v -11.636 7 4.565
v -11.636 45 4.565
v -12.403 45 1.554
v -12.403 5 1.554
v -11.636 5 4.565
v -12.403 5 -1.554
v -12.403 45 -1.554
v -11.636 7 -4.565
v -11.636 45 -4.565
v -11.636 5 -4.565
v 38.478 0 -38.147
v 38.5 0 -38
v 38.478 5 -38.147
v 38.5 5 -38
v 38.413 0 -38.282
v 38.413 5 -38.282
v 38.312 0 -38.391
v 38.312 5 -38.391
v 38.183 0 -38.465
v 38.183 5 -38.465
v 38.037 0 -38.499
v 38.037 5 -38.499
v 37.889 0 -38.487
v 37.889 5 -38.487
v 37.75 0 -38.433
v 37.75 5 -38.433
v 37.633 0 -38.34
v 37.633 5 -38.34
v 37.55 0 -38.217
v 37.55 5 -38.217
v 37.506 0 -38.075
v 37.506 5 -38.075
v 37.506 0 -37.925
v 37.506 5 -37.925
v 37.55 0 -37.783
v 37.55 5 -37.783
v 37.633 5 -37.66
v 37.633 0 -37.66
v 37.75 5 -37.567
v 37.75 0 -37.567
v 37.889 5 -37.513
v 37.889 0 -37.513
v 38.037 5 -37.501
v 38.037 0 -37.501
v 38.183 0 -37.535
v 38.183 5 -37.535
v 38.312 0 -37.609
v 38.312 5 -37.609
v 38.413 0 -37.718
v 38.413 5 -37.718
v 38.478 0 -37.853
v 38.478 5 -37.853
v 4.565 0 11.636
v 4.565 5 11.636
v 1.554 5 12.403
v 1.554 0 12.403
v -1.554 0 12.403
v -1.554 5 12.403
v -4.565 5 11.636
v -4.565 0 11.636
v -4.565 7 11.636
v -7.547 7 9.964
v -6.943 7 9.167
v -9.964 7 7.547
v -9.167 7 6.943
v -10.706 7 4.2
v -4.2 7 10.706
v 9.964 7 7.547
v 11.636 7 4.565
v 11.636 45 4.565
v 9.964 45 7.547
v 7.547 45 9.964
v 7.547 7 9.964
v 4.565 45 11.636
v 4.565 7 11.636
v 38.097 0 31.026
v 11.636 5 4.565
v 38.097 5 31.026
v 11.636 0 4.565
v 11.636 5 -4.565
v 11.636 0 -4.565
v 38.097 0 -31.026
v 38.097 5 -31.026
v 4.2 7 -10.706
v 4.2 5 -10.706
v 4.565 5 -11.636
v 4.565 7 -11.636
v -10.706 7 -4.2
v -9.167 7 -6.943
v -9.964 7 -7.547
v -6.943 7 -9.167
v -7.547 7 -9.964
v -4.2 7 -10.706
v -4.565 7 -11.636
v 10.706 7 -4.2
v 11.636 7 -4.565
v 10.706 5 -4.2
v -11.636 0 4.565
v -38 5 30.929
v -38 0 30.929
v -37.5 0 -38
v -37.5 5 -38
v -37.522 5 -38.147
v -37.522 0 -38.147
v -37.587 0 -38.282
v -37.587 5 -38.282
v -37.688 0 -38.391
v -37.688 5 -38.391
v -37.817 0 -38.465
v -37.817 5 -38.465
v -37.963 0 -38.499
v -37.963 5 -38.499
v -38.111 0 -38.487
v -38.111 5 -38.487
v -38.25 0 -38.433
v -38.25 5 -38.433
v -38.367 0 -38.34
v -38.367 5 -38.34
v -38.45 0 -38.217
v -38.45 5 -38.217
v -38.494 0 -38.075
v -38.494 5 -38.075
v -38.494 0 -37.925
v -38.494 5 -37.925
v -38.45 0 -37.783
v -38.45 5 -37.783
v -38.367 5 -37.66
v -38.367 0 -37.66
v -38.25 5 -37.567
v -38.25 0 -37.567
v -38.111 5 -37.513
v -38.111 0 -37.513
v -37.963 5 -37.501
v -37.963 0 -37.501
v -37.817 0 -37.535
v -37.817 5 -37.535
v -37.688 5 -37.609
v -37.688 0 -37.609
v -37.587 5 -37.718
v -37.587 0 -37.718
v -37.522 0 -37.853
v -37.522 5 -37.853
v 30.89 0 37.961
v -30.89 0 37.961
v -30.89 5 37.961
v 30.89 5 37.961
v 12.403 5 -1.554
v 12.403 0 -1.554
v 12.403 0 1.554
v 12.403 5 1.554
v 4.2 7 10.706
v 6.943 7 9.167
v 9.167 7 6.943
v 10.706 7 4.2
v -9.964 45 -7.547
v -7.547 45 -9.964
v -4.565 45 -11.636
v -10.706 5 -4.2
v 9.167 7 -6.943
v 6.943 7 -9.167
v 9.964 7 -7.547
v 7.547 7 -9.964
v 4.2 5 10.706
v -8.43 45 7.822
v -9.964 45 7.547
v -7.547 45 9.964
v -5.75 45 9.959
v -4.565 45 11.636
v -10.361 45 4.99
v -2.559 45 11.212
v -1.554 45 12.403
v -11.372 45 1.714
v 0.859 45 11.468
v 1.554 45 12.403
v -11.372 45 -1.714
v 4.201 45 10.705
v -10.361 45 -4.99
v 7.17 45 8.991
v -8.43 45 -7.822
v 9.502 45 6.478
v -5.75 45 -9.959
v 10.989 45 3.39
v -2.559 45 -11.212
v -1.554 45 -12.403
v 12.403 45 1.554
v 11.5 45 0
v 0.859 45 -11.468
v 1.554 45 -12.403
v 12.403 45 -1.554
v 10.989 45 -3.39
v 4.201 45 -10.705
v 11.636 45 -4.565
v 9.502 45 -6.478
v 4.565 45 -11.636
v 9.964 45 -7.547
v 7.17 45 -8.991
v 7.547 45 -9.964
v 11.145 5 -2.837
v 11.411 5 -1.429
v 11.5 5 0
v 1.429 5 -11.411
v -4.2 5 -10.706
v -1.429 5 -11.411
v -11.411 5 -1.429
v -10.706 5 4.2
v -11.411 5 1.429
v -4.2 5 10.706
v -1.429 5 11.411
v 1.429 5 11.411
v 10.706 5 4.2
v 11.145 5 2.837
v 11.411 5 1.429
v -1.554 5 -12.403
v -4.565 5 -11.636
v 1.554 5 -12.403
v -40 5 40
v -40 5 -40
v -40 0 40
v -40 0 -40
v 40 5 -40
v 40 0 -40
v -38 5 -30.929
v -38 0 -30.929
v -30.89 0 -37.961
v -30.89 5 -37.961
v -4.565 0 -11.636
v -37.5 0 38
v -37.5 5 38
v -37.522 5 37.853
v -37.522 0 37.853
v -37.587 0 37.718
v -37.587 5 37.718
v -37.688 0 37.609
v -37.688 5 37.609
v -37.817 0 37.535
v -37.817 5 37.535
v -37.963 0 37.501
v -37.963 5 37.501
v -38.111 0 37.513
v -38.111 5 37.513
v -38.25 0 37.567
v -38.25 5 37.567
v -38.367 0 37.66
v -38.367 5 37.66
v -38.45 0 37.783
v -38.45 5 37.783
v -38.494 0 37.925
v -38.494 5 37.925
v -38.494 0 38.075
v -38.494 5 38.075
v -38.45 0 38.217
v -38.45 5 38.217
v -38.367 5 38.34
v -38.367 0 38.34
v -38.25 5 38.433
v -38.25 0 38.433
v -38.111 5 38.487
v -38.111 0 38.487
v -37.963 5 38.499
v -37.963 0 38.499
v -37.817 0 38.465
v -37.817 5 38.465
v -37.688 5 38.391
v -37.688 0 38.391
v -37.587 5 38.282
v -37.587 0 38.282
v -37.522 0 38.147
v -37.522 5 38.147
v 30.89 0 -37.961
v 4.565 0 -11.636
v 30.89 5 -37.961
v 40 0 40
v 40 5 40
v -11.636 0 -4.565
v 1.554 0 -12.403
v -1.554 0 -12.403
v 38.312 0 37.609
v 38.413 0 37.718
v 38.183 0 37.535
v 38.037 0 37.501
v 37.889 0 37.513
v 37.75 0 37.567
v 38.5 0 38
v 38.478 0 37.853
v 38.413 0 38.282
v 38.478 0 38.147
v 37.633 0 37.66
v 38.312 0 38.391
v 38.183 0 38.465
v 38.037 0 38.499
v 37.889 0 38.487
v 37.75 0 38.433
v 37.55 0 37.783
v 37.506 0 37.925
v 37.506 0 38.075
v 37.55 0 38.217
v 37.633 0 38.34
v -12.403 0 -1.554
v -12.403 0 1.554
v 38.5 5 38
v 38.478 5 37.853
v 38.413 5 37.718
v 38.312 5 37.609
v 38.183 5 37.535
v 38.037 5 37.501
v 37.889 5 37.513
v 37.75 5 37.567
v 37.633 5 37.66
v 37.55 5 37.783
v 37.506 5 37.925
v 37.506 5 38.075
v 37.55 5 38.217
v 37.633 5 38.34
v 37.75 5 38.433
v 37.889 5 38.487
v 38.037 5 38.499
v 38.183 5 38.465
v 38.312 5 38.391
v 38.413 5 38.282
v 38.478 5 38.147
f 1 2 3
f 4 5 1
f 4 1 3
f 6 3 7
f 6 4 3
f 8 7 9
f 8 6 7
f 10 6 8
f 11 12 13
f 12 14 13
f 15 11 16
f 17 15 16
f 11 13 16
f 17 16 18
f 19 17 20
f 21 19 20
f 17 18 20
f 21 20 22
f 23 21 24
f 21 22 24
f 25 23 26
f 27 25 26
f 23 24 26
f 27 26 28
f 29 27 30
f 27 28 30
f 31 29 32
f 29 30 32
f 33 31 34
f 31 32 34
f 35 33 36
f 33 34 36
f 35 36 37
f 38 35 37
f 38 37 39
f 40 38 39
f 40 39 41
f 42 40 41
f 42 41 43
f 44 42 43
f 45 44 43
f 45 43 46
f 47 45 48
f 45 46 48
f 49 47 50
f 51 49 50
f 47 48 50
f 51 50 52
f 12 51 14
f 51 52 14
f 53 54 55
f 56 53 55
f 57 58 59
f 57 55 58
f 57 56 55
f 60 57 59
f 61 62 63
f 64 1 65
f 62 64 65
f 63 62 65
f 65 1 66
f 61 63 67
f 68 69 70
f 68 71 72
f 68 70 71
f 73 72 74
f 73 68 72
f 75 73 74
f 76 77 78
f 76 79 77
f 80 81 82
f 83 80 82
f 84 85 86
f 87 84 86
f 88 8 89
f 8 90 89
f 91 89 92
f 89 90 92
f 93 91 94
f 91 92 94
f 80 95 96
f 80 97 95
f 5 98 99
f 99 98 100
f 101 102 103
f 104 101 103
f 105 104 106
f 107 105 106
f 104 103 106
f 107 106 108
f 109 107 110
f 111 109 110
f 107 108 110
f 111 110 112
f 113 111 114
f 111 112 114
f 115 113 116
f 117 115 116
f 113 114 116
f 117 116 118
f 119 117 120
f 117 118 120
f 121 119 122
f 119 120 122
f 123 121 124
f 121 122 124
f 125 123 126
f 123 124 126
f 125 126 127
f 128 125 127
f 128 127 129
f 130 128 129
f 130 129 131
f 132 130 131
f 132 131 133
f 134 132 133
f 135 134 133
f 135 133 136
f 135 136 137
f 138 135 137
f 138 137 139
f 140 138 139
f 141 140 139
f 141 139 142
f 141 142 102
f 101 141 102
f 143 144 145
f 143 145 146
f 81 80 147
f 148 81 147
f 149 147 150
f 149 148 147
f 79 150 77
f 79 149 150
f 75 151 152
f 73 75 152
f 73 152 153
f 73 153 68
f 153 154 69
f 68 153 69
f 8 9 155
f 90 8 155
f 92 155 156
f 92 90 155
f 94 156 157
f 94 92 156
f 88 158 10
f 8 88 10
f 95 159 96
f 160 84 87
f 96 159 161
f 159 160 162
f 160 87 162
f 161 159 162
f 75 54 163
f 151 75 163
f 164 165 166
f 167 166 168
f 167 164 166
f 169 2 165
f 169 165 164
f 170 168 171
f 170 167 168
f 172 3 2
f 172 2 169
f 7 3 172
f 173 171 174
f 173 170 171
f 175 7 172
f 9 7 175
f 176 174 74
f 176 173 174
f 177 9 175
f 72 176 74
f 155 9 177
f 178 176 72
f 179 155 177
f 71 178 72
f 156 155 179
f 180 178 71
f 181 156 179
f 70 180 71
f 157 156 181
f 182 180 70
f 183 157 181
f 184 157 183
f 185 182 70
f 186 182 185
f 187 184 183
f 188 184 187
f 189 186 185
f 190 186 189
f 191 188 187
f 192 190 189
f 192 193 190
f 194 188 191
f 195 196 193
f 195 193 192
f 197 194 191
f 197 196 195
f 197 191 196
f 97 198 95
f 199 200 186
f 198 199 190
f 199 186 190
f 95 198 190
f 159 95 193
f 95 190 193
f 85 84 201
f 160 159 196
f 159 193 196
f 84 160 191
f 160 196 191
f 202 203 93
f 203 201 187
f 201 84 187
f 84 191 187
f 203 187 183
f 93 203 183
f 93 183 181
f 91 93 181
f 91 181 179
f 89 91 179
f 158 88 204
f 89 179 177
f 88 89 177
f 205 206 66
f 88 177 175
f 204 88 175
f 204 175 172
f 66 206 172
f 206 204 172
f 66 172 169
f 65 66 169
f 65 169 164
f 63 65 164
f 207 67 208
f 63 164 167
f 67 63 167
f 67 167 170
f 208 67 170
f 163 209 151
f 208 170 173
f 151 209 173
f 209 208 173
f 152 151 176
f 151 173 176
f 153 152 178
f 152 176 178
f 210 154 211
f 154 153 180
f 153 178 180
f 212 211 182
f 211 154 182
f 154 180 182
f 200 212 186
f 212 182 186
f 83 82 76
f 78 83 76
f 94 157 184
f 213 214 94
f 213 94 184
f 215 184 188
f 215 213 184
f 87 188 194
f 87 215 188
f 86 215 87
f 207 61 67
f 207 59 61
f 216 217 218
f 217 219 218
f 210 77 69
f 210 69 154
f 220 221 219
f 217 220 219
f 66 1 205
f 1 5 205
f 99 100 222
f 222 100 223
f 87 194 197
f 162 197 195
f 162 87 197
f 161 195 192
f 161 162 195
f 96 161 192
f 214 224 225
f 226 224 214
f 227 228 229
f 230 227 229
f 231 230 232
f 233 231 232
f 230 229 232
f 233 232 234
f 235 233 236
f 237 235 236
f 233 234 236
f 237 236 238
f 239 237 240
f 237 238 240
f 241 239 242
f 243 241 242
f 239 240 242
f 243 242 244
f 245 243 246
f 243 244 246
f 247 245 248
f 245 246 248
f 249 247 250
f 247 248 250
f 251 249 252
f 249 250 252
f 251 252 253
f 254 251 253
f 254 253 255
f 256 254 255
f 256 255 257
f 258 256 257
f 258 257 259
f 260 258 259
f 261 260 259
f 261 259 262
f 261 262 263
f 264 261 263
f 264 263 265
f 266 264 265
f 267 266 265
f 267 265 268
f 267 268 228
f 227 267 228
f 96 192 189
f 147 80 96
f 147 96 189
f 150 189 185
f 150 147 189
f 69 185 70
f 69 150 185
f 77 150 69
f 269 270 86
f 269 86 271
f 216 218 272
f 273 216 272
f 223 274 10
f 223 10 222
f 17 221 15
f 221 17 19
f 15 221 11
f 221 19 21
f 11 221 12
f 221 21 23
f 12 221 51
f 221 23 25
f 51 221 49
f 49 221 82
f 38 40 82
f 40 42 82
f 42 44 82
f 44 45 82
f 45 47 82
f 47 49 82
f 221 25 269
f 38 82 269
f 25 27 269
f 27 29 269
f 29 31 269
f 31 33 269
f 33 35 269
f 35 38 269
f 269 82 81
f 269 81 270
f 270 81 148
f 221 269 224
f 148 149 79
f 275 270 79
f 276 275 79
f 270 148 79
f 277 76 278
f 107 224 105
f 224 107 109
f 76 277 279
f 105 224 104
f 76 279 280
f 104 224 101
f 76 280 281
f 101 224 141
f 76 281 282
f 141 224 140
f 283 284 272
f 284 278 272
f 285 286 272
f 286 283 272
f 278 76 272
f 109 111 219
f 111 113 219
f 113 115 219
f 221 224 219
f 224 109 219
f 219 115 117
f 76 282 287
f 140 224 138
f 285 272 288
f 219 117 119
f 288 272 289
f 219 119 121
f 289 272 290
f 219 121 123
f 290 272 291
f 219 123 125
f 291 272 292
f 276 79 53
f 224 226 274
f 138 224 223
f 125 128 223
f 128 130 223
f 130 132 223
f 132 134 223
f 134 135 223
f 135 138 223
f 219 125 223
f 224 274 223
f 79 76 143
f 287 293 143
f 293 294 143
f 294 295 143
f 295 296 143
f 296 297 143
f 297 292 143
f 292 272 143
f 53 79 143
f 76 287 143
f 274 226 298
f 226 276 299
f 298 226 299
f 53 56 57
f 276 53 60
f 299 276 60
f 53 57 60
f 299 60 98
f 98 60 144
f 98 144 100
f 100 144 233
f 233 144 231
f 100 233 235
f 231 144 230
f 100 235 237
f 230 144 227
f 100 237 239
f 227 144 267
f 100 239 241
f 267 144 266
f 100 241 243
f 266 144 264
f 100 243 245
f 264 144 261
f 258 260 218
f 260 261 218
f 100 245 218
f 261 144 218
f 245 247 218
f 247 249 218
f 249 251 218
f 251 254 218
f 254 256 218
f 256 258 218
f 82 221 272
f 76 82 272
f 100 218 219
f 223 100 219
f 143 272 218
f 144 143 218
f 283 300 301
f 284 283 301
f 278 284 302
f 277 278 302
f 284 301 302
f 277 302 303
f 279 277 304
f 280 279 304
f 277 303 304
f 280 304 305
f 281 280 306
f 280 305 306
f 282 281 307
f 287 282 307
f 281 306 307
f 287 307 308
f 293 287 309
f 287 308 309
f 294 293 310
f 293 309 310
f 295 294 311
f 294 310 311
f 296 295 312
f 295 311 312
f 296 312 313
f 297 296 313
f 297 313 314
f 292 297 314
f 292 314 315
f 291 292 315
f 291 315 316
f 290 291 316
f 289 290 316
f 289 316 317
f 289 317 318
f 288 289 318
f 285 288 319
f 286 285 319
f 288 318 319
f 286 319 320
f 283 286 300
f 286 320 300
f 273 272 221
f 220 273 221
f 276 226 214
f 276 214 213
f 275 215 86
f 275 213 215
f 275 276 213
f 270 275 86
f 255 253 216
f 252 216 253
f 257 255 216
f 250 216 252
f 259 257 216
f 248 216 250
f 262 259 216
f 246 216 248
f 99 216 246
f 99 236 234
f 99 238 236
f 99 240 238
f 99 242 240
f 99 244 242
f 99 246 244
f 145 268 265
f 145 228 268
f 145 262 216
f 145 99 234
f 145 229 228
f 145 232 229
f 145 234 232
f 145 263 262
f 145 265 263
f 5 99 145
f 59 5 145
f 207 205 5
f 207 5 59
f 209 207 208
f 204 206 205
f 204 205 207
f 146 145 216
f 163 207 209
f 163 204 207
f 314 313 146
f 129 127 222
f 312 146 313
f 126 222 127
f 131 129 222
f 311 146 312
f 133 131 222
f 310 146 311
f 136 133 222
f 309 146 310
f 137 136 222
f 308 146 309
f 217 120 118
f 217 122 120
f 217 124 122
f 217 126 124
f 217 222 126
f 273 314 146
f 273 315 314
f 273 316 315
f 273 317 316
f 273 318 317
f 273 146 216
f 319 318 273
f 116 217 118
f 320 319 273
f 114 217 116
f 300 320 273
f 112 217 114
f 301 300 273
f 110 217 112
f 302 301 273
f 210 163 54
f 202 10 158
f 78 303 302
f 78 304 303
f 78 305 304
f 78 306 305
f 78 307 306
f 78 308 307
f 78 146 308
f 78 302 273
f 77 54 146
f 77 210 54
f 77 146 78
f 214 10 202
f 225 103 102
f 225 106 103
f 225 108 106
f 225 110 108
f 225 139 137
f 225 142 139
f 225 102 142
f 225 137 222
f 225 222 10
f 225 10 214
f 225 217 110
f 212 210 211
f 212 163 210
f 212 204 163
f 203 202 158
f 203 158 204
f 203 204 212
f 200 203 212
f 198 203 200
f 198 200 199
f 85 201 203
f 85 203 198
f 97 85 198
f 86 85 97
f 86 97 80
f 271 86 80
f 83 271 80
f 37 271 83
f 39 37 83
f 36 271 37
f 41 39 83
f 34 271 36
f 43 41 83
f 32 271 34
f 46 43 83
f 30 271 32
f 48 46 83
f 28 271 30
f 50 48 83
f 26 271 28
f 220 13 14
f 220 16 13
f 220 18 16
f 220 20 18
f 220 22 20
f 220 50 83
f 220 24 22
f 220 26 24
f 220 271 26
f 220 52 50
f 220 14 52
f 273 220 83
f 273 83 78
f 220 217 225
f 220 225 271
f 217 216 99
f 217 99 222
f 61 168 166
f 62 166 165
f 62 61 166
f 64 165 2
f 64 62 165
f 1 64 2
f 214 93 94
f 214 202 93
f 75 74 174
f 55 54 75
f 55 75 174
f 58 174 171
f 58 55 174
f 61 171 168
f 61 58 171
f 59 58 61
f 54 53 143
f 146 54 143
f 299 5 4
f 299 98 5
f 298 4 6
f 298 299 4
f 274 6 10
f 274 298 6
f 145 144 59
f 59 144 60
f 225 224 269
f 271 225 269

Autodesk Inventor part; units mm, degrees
ref_plane "YZ Plane" through (0, 0, 0) normal (1, 0, 0) x (0, 1, 0)
ref_plane "XZ Plane" through (0, 0, 0) normal (0, 1, 0) x (-1, 0, 0)
ref_plane "XY Plane" through (0, 0, 0) normal (0, 0, 1) x (1, 0, 0)
sketch "Sketch1" plane through (0, 0, 0) normal (0, 1, 0) x (-1, 0, 0)
  line L0 (-40, 40) -> (-40, -40)
  line L1 (-40, -40) -> (40, -40)
  line L2 (40, -40) -> (40, 40)
  line L3 (40, 40) -> (-40, 40)
  line L4 (18.0792, 11.0081) -> (40, 32.9289)
  line L5 (11.6365, -4.5654) -> (40, -32.9289)
  line L6 (32.9289, -40) -> (4.5654, -11.6365)
  line L7 (-4.5654, 11.6365) -> (-32.9289, 40)
  line L8 (-11.6365, 4.5654) -> (-40, 32.9289)
  line L9 (32.9289, 40) -> (4.5654, 11.6365)
  line L10 (-11.6365, -4.5654) -> (-40, -32.9289)
  line L11 (-3.5355, 3.5355) -> (0, 0) construction
  line L12 (18.0792, 11.0081) -> (11.6365, 4.5654)
  line L13 (-4.5654, -11.6365) -> (-32.9289, -40)
  line L14 (30.8898, 37.9609) -> (-30.8898, 37.9609)
  line L15 (38, 30.9289) -> (38, -30.9289)
  line L16 (30.8898, -37.9609) -> (-30.8898, -37.9609)
  line L17 (-38.0969, -31.0259) -> (-38.0969, 31.0259)
  circle A0 centre (0, 0) radius 12.5
  point P0 (0, 0)
  dimension "d8" = 25
  dimension "d0" = 80
  dimension "d1" = 80
  dimension "d3" = 10
  dimension "d4" = 10
  dimension "d5" = 10
  dimension "d6" = 10
  dimension "d7" = 2
  dimension "d9" = 7.0711
  dimension "d10" = 7.0711
  dimension "d11" = 7.0711
  dimension "d12" = 7.0711
  dimension "d13" = 7.0711
  dimension "d14" = 7.0711
  dimension "d15" = 7.0711
extrude "Extrusion1" add sketch "Sketch1" along normal blind 5 contours L3 L7 A0 L8 L0 | L8 L17 L10 L0 | L3 L9 L14 L7 | L10 A0 L13 L1 L0 | L3 L2 L4 L12 A0 L9 | A0 | L13 L16 L6 L1 | L2 L5 L15 L4 | L6 A0 L5 L2 L1
sketch "Sketch2" plane through (0, 5, 0) normal (0, 1, 0) x (1, 0, 0)
  line L0 (-11.6365, -4.5654) -> (-38, -30.9289) projected
  line L1 (-38, -30.9289) -> (-38, 30.9289) projected
  line L2 (-38, 30.9289) -> (-11.6365, 4.5654) projected
  arc A0 (-11.6365, 4.5654) -> (-11.6365, -4.5654) centre (0, 0) ccw projected
  line L3 (-4.5654, 11.6365) -> (-30.8898, 37.9609) projected
  line L4 (-30.8898, 37.9609) -> (30.8898, 37.9609) projected
  line L5 (30.8898, 37.9609) -> (4.5654, 11.6365) projected
  arc A1 (4.5654, 11.6365) -> (-4.5654, 11.6365) centre (0, 0) ccw projected
  line L6 (11.6365, 4.5654) -> (38.0969, 31.0259) projected
  line L7 (38.0969, 31.0259) -> (38.0969, -31.0259) projected
  line L8 (38.0969, -31.0259) -> (11.6365, -4.5654) projected
  arc A2 (11.6365, -4.5654) -> (11.6365, 4.5654) centre (0, 0) ccw projected
  arc A3 (-4.5654, -11.6365) -> (4.5654, -11.6365) centre (0, 0) ccw projected
  line L9 (4.5654, -11.6365) -> (30.8898, -37.9609) projected
  line L10 (30.8898, -37.9609) -> (-30.8898, -37.9609) projected
  line L11 (-30.8898, -37.9609) -> (-4.5654, -11.6365) projected
  line L12 (-40, 40) -> (-40, -40) projected
  line L13 (-40, -40) -> (40, -40) projected
  line L14 (40, -40) -> (40, 40) projected
  line L15 (40, 40) -> (-40, 40) projected
  circle A4 centre (0, 0) radius 12.5
  point P0 (0, 0)
extrude "Extrusion2" add sketch "Sketch2" along normal blind 40 contours A0 A4 A1 A2 A3
sketch "Sketch3" plane through (0, 45, 0) normal (0, 1, 0) x (1, 0, 0)
  circle A0 centre (0, 0) radius 11.5
  circle A1 centre (0, 0) radius 12.5 projected
  dimension "d20" = 1
sketch "Sketch4" plane through (0, 5, 0) normal (0, 1, 0) x (1, 0, 0)
  line L0 (-40, 40) -> (-40, -40) projected
  line L1 (-40, -40) -> (40, -40) projected
  line L2 (40, -40) -> (40, 40) projected
  line L3 (40, 40) -> (-40, 40) projected
  arc A0 (-4.5654, 11.6365) -> (-11.6365, 4.5654) centre (0, 0) ccw projected
  line L4 (-4.5654, 11.6365) -> (-30.8898, 37.9609) projected
  line L5 (-30.8898, 37.9609) -> (30.8898, 37.9609) projected
  line L6 (30.8898, 37.9609) -> (4.5654, 11.6365) projected
  arc A1 (11.6365, 4.5654) -> (4.5654, 11.6365) centre (0, 0) ccw projected
  line L7 (11.6365, 4.5654) -> (38.0969, 31.0259) projected
  line L8 (38.0969, 31.0259) -> (38.0969, -31.0259) projected
  line L9 (38.0969, -31.0259) -> (11.6365, -4.5654) projected
  arc A2 (4.5654, -11.6365) -> (11.6365, -4.5654) centre (0, 0) ccw projected
  line L10 (4.5654, -11.6365) -> (30.8898, -37.9609) projected
  line L11 (30.8898, -37.9609) -> (-30.8898, -37.9609) projected
  line L12 (-30.8898, -37.9609) -> (-4.5654, -11.6365) projected
  arc A3 (-11.6365, -4.5654) -> (-4.5654, -11.6365) centre (0, 0) ccw projected
  line L13 (-11.6365, -4.5654) -> (-38, -30.9289) projected
  line L14 (-38, -30.9289) -> (-38, 30.9289) projected
  line L15 (-38, 30.9289) -> (-11.6365, 4.5654) projected
  line L16 (40, -40) -> (40, 40) construction
  line L17 (-40, 40) -> (40, -40) construction
  line L18 (40, -40) -> (-40, -40) construction
  line L19 (-40, -40) -> (40, 40) construction
  circle A4 centre (-38, 38) radius 1 construction
  circle A5 centre (-38, 38) radius 0.5
  line L20 (0, 42.5654) -> (0, -45.1181) construction
  line L21 (45.7517, 0) -> (-46.765, 0) construction
  circle A6 centre (38, 38) radius 0.5
  circle A7 centre (38, -38) radius 0.5
  circle A8 centre (-38, -38) radius 0.5
  point P0 (0, 0)
  dimension "d21" = 2
  dimension "d22" = 1
extrude "Extrusion3" cut sketch "Sketch4" against normal blind 40 contours A5 | A6 | A7 | A8
sketch "Sketch5" plane through (0, 0, 0) normal (1, 0, 0) x (0, 1, 0)
  line L0 (0, -12.5) -> (45, -12.5) projected
  line L1 (5, -37.9609) -> (5, -11.6365) projected
  line L2 (0, -37.9609) -> (0, -11.6365) projected
  line L3 (0, -11.6365) -> (5, -11.6365) projected
  line L4 (0, -31.0259) -> (5, -31.0259) projected
  line L5 (5, -4.5654) -> (5, -31.0259) projected
  line L6 (0, -4.5654) -> (5, -4.5654) projected
  line L7 (0, -4.5654) -> (0, -31.0259) projected
  line L8 (0, 31.0259) -> (5, 31.0259) projected
  line L9 (0, 31.0259) -> (0, 4.5654) projected
  line L10 (0, 4.5654) -> (5, 4.5654) projected
  line L11 (5, 31.0259) -> (5, 4.5654) projected
  line L12 (5, 11.6365) -> (5, 4.5654) projected
  line L13 (0, 12.5) -> (45, 12.5) projected
  line L14 (5, -31.0259) -> (5, 31.0259) projected
  line L15 (5, 40) -> (5, -40) construction
  line L16 (5, -12.5) -> (7, -12.5) construction
  line L17 (7, -12.5) -> (7, 12.5) construction
  line L18 (7, -10.5) -> (5, -10.5)
  line L19 (7, 10.5) -> (5, 10.5)
  line L20 (7, -10.5) -> (7, 10.5)
  line L21 (5, -10.5) -> (5, 10.5)
  line L22 (7, 0) -> (5, 0)
  line L23 (-9, 0) -> (54, 0) projected
  point P0 (0, 0)
  dimension "d25" = 2
  dimension "d26" = 2
  dimension "d27" = 2
revolve "Revolution1" cut sketch "Sketch5" angle 360 about axis through (0, -10, 0) along (0, 1, 0) contours L5 L14 L22 L20 L18
sketch "Sketch6" plane through (0, 5, 0) normal (0, 1, 0) x (1, 0, 0)
  circle A0 centre (0, 0) radius 12.5
  circle A1 centre (0, 0) radius 10.0217
  line L0 (11.6365, -4.5654) -> (0, 0)
  line L1 (0, 0) -> (4.6076, -11.6198)
  arc A2 (-4.5654, -11.6365) -> (4.5654, -11.6365) centre (0, 0) ccw projected
  line L2 (0, 0) -> (-4.5654, -11.6365)
  line L3 (-11.6365, -4.5654) -> (-38, -30.9289) projected
  line L4 (0, 0) -> (-11.6365, -4.5654)
  arc A3 (11.6365, -4.5654) -> (11.6365, 4.5654) centre (0, 0) ccw projected
  line L5 (0, 0) -> (11.6365, 4.5654)
  line L6 (11.6365, 4.5654) -> (0, 0)
  line L7 (0, 0) -> (4.5654, 11.6365)
  line L8 (0, 0) -> (-4.5654, 11.6365)
  line L9 (0, 0) -> (-11.6365, 4.5654)
extrude "Extrusion4" cut sketch "Sketch6" along normal blind 2 contours A0 L1 A1 L0 | A1 L1 L0 | L8 A1 L9 A0 | L9 A1 L8
sketch "Sketch7" plane through (0, 5, 0) normal (0, 1, 0) x (1, 0, 0)
  arc A0 (11.6365, -4.5654) -> (11.6365, 4.5654) centre (0, 0) ccw projected
  arc A1 (4.5654, -11.6365) -> (11.6365, -4.5654) centre (0, 0) ccw
  arc A2 (-11.6365, -4.5654) -> (-4.5654, -11.6365) centre (0, 0) ccw
  arc A3 (11.6365, 4.5654) -> (4.5654, 11.6365) centre (0, 0) ccw
  arc A4 (-4.5654, 11.6365) -> (-11.6365, 4.5654) centre (0, 0) ccw
  line L0 (11.6365, -4.5654) -> (8.3603, -3.28)
  line L1 (-8.3603, 3.28) -> (-11.6365, 4.5654)
  line L2 (4.5654, -11.6365) -> (3.28, -8.3603)
  line L3 (-3.28, 8.3603) -> (-4.5654, 11.6365)
  line L4 (-4.5654, -11.6365) -> (-3.28, -8.3603)
  line L5 (3.28, 8.3603) -> (4.5654, 11.6365)
  line L6 (-11.6365, -4.5654) -> (-8.3603, -3.28)
  line L7 (8.3603, 3.28) -> (11.6365, 4.5654)
  arc A5 (3.28, -8.3603) -> (8.3603, -3.28) centre (0, 0) ccw
  arc A6 (-8.3603, -3.28) -> (-3.28, -8.3603) centre (0, 0) ccw
  arc A7 (8.3603, 3.28) -> (3.28, 8.3603) centre (0, 0) ccw
  arc A8 (-3.28, 8.3603) -> (-8.3603, 3.28) centre (0, 0) ccw
  dimension "d31" = 8.9807
  dimension "d32" = 3.2761
  dimension "d33" = 3.2761
  dimension "d34" = 3.2761
extrude "Extrusion5" cut sketch "Sketch7" along normal blind 2
extrude "Extrusion6" cut sketch "Sketch3" against normal blind 40 contours A0
sketch "Sketch8" plane through (0, 45, 0) normal (0, 1, 0) x (1, 0, 0)
  point P0 (0, 0)
properties part number "Motor housing for Lifting Platform"
